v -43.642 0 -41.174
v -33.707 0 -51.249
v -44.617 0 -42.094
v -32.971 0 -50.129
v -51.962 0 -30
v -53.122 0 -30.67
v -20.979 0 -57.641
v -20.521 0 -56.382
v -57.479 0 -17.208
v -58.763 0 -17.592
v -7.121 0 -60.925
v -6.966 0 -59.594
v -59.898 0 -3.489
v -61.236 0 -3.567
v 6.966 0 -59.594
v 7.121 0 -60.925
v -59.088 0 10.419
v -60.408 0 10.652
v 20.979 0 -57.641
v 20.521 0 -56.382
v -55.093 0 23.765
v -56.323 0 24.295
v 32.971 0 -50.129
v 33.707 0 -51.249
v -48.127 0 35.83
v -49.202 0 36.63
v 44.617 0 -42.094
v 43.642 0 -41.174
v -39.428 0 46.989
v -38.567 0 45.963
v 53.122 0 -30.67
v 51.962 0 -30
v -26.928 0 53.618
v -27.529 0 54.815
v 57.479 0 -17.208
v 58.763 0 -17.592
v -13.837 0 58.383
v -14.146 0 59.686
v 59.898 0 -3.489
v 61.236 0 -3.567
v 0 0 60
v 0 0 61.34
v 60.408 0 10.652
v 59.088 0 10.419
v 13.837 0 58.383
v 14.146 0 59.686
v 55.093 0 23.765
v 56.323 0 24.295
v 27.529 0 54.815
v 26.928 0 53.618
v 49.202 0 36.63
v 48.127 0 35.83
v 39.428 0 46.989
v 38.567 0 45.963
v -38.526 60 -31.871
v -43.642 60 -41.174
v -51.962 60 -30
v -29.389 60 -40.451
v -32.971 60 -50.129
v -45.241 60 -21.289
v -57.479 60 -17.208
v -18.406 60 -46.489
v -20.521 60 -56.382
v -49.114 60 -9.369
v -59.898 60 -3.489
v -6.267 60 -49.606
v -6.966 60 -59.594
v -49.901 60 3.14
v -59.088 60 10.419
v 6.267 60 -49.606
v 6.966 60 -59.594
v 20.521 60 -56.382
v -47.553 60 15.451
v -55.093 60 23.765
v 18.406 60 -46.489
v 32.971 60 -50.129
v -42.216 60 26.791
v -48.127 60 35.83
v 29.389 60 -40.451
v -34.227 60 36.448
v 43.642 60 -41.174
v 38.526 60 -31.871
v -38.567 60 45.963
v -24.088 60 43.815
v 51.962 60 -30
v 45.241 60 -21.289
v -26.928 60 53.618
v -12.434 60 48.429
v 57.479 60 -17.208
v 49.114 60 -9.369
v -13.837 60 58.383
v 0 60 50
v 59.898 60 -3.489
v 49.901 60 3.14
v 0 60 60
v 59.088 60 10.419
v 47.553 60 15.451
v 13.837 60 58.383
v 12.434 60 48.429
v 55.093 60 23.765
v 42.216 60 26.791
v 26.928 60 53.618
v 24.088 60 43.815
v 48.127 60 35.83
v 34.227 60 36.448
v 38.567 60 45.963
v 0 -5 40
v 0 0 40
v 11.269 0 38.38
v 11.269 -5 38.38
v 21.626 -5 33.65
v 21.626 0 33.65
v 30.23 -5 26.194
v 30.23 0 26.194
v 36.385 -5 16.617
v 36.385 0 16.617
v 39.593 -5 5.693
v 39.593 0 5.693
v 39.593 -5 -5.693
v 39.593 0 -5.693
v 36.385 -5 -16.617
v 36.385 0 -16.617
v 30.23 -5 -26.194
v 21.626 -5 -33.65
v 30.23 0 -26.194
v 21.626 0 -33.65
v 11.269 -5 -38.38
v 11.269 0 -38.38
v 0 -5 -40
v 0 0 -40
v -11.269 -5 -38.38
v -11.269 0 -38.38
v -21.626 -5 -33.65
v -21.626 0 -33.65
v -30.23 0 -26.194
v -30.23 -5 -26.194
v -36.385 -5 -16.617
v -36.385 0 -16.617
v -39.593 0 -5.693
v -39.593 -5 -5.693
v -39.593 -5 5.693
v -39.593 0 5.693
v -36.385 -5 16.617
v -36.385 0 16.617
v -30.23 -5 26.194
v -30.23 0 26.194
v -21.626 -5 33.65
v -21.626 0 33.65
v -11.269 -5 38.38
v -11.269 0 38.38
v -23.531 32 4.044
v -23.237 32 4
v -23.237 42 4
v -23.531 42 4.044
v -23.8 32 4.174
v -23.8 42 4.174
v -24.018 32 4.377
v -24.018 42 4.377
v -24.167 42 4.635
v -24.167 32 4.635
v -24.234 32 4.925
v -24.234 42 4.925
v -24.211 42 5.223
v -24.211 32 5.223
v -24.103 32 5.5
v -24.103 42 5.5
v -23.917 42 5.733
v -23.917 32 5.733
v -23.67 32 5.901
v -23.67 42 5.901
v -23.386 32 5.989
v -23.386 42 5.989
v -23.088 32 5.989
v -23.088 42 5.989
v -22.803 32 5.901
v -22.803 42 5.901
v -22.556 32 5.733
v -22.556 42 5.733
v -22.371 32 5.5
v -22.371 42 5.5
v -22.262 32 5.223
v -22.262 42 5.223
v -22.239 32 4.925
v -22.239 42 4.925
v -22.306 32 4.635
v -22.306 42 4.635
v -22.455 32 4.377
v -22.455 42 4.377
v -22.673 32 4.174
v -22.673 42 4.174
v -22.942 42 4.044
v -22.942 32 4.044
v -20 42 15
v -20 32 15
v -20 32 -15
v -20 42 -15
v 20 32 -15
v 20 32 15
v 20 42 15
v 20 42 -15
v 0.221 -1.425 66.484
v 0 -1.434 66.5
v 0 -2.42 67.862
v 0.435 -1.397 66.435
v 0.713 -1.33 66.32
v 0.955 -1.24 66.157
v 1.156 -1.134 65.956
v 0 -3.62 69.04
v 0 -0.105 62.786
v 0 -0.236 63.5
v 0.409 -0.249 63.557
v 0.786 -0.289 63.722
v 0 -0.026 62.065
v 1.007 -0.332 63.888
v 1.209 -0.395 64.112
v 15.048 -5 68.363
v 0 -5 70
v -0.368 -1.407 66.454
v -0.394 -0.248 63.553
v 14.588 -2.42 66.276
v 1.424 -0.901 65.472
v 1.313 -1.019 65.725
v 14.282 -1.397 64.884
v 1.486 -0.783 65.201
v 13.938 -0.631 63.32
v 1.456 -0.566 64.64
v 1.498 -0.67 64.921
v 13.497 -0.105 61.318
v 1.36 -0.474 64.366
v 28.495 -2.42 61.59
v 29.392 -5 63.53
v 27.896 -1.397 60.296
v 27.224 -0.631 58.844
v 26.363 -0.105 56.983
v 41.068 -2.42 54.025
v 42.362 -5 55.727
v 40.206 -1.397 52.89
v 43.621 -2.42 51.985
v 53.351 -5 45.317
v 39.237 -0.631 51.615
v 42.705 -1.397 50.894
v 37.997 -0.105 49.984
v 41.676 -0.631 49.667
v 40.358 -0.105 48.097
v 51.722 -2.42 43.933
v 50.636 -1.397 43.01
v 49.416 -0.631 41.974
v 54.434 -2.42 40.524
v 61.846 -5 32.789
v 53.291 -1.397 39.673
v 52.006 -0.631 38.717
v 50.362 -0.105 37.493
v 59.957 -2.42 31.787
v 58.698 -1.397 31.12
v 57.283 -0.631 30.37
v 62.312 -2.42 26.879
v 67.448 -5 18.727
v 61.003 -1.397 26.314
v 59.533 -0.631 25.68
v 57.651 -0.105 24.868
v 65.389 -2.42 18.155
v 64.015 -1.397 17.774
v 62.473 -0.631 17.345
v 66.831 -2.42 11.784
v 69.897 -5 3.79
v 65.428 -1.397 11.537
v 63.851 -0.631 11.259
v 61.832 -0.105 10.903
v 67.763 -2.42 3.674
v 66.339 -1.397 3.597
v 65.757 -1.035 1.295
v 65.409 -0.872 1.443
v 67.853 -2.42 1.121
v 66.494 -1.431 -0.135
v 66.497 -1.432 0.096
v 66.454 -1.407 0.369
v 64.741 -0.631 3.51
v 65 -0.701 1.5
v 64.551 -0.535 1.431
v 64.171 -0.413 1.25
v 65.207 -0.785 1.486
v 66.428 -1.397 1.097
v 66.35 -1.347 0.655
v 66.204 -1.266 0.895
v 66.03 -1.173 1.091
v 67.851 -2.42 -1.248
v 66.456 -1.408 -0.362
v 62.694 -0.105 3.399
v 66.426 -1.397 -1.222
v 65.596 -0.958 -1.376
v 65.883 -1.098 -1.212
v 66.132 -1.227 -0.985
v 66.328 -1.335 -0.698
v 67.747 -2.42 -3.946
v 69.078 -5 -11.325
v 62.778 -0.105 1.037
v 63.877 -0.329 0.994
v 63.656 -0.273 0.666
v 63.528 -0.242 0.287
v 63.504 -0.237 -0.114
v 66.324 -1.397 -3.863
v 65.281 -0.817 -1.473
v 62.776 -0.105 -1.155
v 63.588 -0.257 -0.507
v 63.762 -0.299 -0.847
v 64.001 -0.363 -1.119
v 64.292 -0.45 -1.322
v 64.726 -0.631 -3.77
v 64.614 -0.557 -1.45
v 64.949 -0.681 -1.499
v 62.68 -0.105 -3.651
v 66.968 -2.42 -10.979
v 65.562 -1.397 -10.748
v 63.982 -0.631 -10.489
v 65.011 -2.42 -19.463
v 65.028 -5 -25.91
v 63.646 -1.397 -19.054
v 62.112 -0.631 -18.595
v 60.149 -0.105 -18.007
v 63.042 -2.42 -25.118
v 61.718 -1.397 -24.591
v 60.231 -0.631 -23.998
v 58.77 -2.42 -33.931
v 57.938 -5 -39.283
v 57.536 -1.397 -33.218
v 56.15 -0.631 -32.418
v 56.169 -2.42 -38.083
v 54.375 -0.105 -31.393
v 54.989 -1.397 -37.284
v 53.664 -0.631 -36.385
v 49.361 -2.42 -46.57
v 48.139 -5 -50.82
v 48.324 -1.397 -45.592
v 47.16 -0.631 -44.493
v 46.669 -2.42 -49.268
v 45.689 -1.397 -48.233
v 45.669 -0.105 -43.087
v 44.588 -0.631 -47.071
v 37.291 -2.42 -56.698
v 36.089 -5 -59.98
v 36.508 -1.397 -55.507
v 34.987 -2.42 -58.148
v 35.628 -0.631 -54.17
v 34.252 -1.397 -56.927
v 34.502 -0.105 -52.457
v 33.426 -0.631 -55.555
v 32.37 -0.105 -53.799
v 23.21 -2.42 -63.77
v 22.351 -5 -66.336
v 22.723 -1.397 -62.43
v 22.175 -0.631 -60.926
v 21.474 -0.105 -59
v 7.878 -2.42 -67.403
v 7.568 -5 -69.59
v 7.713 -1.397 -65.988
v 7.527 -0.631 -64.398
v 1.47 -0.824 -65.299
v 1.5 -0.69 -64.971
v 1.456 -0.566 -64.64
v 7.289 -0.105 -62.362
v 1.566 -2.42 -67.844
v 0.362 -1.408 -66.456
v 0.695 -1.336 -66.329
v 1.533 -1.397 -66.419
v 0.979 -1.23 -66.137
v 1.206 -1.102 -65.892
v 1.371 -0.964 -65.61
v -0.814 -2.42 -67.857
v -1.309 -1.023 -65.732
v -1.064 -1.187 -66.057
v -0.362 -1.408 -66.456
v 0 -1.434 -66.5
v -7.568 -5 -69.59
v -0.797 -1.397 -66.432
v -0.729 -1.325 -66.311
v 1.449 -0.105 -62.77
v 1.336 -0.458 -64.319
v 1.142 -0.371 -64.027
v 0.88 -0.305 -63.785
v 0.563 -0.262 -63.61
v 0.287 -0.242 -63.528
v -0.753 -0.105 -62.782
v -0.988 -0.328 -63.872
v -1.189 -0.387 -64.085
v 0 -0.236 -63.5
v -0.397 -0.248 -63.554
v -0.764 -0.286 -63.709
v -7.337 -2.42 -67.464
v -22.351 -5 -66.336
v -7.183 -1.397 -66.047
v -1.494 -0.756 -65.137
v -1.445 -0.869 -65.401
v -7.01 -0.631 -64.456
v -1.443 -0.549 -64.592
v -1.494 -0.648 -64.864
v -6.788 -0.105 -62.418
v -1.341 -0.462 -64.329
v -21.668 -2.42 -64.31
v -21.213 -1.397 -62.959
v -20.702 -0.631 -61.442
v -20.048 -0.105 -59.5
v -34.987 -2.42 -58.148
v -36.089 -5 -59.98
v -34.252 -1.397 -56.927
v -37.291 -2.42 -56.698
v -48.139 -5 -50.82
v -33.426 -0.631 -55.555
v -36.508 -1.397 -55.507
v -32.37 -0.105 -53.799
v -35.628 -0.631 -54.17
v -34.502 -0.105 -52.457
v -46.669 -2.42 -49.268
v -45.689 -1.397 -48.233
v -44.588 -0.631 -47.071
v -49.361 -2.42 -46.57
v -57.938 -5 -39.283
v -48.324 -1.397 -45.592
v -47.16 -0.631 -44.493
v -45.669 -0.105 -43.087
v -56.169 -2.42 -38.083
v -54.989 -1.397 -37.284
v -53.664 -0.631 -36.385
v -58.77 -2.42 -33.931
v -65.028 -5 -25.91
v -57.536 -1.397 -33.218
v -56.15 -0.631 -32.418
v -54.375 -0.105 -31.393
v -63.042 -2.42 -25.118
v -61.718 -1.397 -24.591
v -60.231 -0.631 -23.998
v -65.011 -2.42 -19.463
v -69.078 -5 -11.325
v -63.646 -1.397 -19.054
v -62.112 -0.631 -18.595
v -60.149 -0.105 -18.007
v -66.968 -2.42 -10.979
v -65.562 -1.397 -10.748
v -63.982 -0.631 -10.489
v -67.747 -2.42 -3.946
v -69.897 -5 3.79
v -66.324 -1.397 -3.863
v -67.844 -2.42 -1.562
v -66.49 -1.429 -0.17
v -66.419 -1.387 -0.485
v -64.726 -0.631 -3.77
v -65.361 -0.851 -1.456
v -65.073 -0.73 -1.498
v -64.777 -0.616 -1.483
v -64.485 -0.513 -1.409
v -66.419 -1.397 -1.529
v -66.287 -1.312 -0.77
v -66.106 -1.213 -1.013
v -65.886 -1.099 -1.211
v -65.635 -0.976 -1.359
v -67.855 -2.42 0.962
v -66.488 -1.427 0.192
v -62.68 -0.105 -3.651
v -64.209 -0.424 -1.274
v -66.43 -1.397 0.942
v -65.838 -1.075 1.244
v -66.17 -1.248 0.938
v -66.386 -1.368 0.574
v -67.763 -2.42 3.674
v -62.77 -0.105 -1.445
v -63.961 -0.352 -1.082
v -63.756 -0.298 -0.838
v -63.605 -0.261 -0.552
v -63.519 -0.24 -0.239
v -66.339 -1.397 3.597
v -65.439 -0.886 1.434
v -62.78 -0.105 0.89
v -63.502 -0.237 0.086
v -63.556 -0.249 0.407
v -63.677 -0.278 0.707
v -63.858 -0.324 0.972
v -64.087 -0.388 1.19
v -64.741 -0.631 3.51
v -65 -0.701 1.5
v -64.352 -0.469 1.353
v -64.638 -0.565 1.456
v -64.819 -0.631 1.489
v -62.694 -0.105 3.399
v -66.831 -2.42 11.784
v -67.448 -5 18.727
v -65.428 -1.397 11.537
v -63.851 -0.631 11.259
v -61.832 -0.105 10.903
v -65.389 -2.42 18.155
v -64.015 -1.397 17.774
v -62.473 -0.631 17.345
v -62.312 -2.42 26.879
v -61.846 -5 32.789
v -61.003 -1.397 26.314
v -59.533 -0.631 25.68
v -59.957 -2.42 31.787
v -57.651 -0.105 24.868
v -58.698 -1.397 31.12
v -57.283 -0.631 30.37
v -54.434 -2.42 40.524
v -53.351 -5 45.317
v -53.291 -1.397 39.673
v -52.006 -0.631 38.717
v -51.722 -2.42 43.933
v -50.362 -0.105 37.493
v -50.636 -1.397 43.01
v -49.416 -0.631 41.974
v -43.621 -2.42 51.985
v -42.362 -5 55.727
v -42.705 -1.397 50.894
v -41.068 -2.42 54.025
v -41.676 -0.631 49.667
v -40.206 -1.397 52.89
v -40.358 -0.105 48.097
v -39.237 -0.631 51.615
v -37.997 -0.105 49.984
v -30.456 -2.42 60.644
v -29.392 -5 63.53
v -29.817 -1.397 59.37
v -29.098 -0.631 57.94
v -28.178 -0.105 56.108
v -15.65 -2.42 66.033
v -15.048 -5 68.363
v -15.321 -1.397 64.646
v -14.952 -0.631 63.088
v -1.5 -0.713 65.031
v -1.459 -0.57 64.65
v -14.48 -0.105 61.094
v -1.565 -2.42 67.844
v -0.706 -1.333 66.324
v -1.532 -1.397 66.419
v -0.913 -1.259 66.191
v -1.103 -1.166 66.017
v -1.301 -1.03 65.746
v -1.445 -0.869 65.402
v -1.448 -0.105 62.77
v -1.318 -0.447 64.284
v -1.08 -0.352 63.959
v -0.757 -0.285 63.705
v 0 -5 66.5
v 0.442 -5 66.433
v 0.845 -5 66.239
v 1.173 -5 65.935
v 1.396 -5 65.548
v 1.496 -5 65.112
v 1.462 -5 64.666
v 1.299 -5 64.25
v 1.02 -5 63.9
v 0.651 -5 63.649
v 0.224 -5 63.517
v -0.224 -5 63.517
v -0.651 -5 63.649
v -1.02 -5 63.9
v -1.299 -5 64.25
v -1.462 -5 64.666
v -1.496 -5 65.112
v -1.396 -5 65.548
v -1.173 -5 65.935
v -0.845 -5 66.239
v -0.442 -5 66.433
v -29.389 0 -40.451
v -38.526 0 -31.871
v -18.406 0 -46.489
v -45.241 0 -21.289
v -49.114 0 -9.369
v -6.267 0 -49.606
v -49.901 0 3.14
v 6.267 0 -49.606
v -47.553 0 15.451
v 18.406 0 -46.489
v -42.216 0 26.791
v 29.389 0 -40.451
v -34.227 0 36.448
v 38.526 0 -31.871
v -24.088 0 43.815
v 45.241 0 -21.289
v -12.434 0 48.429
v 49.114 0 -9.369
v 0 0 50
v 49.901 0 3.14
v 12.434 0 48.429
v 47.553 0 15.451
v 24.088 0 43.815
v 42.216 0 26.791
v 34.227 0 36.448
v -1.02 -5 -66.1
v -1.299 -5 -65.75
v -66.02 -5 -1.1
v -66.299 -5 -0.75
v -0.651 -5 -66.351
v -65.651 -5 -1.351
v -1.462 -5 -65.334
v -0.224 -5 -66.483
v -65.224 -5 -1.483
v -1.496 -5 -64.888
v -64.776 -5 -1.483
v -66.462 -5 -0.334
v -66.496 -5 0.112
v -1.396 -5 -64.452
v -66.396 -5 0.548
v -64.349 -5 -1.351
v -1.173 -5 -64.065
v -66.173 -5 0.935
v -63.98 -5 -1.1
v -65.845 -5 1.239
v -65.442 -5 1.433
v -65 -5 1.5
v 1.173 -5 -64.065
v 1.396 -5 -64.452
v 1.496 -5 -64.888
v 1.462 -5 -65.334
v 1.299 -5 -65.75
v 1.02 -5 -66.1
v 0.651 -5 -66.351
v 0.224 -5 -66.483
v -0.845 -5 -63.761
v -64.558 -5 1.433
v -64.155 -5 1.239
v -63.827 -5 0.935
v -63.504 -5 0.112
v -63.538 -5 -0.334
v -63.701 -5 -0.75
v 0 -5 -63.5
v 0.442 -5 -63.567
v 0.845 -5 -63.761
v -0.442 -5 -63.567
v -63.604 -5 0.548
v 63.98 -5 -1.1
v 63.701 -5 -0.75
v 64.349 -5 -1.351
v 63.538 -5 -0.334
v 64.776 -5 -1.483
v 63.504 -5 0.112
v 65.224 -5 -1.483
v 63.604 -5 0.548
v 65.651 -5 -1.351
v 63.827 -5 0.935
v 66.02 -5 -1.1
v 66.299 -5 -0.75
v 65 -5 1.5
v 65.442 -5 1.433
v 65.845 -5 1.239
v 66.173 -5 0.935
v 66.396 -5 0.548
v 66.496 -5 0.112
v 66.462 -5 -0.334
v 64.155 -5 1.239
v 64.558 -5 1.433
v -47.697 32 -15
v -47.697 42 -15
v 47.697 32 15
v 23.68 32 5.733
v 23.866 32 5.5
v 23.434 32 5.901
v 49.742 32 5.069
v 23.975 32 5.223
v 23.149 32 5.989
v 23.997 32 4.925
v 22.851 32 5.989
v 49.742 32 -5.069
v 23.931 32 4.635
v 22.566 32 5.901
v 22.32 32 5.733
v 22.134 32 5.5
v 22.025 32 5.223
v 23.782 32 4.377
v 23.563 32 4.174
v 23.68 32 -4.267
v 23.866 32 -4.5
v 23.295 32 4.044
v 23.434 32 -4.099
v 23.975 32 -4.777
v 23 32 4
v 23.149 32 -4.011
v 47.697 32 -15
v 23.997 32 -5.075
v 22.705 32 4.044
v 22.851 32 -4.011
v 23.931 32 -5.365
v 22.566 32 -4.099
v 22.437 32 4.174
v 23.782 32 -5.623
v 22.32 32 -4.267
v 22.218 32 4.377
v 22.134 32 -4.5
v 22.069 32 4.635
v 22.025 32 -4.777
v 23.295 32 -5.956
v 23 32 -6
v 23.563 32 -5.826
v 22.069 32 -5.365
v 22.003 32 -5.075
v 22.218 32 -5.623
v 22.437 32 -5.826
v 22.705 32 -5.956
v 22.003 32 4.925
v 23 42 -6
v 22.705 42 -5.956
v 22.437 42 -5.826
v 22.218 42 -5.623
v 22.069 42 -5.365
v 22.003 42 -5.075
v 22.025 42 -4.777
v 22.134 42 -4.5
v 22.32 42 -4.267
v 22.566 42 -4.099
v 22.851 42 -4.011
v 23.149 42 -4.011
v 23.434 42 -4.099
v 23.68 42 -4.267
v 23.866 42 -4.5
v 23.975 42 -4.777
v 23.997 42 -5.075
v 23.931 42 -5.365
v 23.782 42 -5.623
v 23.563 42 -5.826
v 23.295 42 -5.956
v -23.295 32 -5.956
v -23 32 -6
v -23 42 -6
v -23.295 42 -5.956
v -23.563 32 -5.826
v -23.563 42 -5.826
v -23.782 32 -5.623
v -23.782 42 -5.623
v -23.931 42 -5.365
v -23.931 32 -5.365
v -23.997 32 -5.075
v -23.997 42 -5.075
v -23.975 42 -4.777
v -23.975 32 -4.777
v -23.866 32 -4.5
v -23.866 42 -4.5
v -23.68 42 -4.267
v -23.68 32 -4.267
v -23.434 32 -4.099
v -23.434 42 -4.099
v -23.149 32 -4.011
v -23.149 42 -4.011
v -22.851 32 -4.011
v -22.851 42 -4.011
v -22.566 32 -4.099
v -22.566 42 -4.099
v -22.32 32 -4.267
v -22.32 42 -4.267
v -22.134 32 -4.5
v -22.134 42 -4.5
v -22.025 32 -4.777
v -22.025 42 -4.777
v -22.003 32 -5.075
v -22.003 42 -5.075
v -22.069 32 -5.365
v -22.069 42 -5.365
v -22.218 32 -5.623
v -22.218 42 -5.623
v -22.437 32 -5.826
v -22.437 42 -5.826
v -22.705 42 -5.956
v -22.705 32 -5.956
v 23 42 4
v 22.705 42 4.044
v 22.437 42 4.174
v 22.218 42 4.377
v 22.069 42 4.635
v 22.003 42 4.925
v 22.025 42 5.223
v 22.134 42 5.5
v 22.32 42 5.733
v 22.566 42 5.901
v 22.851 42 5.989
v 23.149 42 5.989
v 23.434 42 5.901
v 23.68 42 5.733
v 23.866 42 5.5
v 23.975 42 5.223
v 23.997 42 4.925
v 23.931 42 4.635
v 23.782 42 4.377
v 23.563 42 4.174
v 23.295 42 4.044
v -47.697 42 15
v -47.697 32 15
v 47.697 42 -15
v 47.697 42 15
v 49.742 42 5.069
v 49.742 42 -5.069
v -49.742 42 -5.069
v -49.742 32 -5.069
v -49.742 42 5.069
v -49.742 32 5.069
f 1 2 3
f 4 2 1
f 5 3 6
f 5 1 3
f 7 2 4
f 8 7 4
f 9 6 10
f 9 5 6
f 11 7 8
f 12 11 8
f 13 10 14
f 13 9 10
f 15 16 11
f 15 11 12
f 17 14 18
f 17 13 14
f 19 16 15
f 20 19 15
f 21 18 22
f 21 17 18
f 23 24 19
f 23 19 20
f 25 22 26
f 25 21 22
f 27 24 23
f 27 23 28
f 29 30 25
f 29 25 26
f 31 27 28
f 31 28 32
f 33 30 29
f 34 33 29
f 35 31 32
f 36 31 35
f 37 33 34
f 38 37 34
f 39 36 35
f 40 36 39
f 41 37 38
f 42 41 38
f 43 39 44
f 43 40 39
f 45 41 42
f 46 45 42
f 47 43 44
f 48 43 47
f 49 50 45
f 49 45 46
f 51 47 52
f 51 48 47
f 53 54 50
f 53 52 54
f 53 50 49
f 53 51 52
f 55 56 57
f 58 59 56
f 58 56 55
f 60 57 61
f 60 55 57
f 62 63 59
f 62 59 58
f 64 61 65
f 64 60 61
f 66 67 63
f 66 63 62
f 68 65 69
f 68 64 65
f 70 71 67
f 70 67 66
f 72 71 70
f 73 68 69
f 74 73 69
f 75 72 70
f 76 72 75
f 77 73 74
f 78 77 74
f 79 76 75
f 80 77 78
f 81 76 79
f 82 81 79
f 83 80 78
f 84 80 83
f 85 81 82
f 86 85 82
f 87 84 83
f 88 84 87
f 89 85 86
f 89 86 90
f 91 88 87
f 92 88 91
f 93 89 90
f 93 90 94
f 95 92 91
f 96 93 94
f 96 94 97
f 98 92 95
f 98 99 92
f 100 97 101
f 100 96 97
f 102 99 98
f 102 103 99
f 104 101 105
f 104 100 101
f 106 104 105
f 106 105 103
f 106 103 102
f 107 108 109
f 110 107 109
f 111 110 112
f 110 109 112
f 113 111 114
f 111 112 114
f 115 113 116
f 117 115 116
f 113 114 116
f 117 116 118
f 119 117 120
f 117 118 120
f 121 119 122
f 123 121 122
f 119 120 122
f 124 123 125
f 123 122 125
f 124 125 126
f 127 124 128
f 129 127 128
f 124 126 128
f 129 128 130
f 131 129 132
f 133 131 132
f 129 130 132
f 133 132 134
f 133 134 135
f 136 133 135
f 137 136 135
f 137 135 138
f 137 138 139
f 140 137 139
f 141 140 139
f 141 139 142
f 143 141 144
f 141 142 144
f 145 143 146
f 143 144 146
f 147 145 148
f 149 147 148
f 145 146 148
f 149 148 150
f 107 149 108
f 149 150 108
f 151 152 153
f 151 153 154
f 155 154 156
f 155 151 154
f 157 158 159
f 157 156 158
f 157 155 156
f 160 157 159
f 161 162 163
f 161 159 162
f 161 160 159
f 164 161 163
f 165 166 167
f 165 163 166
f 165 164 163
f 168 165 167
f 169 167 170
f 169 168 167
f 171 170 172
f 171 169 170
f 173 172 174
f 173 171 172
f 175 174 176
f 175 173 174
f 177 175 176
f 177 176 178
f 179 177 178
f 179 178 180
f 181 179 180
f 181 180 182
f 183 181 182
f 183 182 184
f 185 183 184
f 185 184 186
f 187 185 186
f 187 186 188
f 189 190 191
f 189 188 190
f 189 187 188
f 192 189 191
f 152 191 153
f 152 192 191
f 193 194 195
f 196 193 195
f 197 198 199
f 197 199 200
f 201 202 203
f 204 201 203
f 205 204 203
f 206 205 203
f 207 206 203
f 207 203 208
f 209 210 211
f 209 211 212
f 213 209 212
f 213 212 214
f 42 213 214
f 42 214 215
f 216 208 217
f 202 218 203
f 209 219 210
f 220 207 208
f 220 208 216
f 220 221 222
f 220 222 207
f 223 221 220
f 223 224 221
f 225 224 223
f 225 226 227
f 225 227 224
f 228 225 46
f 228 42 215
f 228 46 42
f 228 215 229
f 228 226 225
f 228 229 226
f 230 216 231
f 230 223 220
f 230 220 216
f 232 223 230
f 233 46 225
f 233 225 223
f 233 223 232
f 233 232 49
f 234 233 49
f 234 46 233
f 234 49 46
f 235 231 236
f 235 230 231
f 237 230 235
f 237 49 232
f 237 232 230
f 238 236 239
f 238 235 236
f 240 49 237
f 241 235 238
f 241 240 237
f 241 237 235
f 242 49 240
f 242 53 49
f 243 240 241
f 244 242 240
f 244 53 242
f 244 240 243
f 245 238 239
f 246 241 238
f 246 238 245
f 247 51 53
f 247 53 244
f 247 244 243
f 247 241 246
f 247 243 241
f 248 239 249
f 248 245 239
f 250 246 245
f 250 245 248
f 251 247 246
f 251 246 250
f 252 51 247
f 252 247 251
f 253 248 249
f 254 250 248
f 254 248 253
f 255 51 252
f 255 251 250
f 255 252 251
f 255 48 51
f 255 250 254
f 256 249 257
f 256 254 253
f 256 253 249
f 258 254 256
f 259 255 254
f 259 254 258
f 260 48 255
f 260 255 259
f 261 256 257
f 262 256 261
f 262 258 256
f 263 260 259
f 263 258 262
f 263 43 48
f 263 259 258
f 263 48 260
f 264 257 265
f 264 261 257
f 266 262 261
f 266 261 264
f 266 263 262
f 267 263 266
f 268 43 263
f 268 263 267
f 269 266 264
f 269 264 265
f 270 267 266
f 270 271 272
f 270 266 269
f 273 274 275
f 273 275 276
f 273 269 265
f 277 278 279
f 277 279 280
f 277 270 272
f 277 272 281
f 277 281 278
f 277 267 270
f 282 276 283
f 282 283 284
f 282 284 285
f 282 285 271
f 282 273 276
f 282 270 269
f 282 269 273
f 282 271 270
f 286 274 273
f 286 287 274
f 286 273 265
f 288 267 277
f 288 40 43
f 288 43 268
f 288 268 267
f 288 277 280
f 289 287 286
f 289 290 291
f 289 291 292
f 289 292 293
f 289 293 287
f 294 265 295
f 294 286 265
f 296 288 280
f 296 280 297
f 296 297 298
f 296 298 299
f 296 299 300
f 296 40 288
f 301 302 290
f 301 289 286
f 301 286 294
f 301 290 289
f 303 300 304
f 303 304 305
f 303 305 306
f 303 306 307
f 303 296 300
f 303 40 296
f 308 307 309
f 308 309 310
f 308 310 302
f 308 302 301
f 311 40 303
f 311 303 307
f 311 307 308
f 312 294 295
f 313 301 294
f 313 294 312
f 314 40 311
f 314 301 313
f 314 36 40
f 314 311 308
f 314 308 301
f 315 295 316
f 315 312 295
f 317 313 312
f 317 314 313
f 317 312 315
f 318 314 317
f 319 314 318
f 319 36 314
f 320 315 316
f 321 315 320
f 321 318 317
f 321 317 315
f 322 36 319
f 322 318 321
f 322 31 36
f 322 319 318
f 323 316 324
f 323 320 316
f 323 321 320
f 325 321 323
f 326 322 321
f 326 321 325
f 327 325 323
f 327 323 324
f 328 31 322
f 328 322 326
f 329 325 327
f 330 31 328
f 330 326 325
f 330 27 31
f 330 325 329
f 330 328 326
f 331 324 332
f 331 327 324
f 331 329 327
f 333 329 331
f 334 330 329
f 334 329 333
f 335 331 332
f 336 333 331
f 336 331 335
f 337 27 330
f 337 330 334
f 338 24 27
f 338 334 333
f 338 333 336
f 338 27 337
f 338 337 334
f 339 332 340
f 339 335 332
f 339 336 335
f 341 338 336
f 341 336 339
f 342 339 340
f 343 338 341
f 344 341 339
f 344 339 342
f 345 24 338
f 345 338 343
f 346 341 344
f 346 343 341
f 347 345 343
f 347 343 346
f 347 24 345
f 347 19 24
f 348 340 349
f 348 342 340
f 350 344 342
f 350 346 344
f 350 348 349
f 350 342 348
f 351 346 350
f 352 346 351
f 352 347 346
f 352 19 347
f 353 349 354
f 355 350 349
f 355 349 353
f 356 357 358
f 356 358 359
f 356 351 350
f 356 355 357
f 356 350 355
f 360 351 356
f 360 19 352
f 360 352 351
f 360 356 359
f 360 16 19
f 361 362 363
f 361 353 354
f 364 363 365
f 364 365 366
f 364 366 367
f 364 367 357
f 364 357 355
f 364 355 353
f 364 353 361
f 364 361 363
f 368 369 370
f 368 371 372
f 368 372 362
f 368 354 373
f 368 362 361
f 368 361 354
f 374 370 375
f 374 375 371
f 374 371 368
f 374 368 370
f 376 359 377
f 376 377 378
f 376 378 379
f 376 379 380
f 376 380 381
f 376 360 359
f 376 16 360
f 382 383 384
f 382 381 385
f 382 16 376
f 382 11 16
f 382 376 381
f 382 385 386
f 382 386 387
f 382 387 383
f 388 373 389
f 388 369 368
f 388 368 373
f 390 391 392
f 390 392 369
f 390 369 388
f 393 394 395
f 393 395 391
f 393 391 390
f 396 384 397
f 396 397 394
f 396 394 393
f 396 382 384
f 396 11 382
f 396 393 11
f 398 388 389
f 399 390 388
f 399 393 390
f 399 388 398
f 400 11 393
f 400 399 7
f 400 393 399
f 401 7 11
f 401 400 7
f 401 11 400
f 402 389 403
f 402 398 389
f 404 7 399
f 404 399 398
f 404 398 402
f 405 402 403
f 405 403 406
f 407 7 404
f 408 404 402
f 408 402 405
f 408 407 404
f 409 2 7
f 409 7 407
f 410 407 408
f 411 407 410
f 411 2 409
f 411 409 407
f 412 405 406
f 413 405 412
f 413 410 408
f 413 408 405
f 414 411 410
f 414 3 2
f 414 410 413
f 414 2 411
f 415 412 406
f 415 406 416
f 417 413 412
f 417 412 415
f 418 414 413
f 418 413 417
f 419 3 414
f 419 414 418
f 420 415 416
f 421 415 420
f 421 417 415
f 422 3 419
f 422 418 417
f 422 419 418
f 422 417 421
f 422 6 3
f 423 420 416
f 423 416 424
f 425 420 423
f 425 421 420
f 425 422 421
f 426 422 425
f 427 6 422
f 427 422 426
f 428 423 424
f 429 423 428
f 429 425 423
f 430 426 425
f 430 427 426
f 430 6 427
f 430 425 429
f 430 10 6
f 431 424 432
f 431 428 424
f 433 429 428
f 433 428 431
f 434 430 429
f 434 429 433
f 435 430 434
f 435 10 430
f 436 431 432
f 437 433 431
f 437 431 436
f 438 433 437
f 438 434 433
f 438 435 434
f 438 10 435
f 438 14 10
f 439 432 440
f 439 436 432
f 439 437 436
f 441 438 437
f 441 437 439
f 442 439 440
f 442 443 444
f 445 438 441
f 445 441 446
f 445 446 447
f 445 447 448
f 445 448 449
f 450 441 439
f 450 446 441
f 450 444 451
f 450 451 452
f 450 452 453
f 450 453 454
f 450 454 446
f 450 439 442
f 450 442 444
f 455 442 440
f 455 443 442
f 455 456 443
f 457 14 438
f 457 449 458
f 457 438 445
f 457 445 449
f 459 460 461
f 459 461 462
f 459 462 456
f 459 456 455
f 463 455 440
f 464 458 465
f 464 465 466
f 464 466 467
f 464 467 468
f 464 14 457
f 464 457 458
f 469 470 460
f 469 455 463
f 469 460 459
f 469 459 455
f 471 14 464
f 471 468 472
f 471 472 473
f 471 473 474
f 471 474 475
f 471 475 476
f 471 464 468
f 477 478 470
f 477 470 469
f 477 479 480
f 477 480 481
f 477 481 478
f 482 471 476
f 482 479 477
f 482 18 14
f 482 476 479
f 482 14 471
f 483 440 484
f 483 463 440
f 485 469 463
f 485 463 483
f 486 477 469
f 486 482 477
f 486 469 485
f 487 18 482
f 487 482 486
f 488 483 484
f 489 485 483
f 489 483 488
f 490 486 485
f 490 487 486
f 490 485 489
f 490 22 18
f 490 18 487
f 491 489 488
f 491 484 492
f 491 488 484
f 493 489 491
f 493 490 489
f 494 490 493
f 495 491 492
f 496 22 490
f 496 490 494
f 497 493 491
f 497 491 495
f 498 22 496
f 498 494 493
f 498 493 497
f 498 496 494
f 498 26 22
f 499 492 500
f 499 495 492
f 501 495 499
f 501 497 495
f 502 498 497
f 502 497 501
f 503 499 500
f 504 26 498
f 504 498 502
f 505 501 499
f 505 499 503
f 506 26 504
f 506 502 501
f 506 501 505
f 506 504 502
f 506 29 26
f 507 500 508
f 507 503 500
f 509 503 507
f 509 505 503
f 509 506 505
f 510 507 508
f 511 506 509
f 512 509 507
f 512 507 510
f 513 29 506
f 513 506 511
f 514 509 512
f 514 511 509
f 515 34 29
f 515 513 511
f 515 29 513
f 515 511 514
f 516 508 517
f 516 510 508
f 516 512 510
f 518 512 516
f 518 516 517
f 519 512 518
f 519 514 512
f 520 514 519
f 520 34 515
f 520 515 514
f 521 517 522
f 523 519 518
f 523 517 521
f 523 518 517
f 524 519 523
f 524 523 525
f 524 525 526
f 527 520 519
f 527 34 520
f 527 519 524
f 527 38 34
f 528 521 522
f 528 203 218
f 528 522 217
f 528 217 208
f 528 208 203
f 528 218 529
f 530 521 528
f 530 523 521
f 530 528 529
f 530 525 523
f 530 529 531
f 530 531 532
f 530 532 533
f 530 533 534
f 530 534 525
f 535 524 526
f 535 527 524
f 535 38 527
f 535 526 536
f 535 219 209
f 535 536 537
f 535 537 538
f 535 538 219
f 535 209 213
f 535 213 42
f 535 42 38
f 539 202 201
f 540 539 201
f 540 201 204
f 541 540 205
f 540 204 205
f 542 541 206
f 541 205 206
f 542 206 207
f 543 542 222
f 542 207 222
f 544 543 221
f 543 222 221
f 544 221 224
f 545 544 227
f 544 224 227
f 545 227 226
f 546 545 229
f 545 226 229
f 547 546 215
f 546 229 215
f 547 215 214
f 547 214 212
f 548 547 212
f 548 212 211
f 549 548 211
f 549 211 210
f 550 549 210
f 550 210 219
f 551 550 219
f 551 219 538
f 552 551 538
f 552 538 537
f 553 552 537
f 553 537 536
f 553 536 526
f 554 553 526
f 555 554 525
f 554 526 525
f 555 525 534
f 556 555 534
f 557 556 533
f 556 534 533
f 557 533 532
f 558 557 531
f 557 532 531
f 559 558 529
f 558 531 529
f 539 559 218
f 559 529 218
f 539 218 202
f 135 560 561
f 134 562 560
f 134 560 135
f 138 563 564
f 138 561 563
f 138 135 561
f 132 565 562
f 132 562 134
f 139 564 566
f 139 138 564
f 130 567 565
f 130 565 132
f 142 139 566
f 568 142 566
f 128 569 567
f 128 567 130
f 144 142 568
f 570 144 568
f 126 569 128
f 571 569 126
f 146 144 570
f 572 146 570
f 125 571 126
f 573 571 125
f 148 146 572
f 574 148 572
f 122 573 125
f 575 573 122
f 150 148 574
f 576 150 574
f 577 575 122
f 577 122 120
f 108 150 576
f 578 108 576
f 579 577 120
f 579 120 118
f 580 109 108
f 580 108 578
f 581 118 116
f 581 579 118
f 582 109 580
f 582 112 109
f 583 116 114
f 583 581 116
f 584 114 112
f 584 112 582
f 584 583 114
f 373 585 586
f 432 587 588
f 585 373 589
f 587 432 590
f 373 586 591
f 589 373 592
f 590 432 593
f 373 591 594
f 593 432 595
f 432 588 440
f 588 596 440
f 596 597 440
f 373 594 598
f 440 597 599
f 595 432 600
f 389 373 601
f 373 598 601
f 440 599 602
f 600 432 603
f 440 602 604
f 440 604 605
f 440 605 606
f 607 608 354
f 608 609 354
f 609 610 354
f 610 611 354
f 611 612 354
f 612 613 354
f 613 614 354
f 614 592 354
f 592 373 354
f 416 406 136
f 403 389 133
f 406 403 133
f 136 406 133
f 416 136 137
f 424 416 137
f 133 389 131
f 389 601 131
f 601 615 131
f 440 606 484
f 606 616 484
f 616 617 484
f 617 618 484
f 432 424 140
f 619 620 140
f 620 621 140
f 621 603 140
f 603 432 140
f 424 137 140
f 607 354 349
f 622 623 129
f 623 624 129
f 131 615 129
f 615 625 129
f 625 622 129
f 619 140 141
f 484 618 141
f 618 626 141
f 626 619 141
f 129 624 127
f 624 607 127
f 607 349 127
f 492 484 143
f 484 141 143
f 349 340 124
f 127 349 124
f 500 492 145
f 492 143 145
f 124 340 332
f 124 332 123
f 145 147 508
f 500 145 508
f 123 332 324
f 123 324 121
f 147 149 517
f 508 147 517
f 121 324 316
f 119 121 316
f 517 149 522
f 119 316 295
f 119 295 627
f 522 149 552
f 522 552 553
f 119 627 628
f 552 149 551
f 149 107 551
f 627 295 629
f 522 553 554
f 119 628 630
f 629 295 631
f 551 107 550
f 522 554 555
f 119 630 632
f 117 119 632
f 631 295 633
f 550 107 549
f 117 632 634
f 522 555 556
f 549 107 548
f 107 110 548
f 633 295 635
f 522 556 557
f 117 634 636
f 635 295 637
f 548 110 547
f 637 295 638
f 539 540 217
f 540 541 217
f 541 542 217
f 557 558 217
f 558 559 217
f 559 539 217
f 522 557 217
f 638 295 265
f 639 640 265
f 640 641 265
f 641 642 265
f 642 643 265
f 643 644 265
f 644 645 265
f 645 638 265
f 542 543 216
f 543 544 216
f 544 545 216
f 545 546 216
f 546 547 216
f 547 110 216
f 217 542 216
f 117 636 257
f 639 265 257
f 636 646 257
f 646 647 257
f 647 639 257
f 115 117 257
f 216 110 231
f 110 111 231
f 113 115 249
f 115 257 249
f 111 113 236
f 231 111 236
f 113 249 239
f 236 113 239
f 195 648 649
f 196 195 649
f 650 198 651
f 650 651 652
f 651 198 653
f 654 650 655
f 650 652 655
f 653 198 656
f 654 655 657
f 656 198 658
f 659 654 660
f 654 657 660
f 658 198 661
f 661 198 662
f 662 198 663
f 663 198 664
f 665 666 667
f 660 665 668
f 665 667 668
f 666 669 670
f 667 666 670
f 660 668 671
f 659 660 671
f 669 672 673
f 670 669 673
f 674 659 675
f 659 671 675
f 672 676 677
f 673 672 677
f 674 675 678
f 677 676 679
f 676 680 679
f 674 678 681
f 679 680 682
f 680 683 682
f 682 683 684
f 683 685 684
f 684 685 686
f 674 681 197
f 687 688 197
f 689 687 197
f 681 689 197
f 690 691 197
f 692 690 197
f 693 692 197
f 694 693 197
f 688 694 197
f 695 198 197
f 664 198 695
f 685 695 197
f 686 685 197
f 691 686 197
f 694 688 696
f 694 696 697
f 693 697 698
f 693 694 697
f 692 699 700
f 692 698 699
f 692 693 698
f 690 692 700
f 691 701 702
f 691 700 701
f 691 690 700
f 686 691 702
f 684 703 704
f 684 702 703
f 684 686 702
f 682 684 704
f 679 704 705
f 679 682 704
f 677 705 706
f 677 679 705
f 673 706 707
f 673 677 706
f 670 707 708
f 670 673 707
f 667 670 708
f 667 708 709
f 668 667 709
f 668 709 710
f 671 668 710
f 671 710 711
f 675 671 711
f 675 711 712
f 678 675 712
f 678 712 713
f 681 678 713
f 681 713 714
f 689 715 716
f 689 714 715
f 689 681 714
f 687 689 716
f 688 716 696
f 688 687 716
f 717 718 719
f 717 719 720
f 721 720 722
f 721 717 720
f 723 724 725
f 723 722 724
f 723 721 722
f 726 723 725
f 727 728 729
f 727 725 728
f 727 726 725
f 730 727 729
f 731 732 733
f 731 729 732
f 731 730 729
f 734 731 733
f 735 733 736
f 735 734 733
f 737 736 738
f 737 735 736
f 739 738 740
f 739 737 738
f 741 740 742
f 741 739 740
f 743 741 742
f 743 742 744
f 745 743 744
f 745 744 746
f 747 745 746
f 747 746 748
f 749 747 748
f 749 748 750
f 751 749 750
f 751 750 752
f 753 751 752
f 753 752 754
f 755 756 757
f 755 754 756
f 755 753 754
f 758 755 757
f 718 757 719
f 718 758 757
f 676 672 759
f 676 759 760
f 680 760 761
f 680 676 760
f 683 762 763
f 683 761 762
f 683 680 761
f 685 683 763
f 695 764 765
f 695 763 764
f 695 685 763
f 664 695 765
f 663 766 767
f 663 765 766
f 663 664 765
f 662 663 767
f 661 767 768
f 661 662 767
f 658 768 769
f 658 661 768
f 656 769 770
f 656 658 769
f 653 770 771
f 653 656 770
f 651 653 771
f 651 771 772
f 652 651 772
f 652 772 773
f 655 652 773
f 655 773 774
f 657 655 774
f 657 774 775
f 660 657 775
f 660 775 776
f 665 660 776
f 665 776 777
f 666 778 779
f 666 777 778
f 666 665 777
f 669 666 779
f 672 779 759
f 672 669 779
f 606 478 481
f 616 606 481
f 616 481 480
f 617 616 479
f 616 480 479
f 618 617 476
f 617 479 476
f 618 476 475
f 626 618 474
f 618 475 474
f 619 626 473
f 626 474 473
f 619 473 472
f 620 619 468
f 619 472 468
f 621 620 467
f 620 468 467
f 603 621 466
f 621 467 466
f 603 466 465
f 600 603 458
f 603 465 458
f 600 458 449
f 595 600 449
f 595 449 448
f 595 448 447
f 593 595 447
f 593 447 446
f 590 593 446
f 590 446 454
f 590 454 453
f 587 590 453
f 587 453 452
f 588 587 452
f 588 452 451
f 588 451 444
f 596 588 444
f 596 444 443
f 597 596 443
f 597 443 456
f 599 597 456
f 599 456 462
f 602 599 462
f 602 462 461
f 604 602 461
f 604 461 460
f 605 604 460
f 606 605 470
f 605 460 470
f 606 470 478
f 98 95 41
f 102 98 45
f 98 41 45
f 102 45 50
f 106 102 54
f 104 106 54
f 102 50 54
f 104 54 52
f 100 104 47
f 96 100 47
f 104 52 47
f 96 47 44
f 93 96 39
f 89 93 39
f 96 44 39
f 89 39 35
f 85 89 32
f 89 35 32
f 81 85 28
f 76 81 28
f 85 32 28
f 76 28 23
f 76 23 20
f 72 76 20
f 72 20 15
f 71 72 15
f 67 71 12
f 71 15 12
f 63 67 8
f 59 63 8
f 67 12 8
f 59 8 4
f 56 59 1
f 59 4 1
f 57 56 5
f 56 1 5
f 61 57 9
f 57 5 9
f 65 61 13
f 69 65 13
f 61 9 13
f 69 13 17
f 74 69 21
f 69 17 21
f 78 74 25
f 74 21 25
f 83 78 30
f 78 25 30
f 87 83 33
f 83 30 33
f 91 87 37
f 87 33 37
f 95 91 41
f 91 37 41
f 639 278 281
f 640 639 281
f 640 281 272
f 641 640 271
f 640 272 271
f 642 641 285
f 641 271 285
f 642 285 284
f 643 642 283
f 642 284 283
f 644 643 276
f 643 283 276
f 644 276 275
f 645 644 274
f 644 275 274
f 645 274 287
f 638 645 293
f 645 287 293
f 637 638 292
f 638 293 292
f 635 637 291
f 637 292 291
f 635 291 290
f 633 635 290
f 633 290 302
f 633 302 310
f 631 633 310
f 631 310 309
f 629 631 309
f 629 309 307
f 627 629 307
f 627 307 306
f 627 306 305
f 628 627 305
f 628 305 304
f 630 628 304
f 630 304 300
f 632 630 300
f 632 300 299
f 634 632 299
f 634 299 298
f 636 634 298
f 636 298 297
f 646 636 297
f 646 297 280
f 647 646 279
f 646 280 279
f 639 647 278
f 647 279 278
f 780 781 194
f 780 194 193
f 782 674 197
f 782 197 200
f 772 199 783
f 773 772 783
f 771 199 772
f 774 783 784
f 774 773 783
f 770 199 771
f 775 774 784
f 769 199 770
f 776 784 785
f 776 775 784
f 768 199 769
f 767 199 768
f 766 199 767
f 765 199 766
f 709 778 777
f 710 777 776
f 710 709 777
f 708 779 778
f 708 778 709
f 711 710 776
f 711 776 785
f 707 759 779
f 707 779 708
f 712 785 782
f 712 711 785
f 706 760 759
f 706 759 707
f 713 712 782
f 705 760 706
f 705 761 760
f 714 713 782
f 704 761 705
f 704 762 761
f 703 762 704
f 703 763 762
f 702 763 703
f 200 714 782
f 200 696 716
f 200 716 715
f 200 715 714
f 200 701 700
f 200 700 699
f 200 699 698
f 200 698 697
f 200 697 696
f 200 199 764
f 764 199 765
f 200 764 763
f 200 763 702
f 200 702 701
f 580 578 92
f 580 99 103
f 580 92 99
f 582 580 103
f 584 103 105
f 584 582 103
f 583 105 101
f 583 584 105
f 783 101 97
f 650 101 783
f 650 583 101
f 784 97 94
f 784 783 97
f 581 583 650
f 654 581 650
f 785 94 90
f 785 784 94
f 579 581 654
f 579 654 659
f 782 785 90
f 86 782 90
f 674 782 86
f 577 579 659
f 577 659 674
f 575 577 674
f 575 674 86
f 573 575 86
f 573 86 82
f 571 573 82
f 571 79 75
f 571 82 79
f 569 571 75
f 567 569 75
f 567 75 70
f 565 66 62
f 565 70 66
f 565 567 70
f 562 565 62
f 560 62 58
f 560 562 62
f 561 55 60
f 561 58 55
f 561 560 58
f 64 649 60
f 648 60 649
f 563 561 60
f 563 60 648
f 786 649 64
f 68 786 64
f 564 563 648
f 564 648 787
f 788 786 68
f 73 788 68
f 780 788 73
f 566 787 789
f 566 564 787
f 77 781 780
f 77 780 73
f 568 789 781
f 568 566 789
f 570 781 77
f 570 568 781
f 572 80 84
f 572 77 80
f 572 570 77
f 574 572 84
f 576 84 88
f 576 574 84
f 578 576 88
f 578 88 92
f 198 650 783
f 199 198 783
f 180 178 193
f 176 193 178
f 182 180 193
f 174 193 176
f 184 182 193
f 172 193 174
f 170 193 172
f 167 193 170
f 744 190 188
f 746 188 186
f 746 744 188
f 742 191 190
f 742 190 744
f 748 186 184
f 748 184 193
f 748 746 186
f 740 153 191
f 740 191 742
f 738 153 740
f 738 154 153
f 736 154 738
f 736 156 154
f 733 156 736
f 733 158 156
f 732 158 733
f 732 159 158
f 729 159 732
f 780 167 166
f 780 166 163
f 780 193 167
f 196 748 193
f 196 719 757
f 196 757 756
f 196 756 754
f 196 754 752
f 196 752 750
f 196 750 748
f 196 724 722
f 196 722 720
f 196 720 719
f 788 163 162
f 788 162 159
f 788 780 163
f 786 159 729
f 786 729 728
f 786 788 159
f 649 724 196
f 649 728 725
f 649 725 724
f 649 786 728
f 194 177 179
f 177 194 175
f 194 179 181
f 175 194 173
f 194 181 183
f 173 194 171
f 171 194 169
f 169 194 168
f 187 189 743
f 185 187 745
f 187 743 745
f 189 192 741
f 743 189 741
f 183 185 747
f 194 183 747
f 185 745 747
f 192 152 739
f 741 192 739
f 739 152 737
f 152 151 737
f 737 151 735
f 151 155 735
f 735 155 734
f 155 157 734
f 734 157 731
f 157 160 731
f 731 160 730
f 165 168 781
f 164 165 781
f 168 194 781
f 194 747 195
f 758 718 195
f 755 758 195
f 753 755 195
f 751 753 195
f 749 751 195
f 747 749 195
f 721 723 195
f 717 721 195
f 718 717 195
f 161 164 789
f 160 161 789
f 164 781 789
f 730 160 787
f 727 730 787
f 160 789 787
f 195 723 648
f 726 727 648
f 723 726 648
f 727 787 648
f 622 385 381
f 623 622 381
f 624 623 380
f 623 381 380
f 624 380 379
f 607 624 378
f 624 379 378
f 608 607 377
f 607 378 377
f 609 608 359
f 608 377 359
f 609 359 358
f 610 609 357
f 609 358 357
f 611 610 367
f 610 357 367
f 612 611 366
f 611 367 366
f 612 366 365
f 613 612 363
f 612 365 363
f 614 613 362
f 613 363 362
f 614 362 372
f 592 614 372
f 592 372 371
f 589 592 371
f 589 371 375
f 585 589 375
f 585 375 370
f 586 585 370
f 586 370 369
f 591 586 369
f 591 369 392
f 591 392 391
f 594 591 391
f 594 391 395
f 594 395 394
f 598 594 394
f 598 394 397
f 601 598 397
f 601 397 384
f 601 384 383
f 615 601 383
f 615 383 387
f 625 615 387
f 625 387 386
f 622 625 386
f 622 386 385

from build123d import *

# Parameters (mm, degrees)
SKETCH1_R                = 60
BOSS_EXTRUDE1_DEPTH      = 60
SHELL1_T                 = -10
SKETCH2_R                = 70
BOSS_EXTRUDE2_DEPTH      = 5
SKETCH5_R                = 40
CUT_EXTRUDE4_DEPTH       = 5
FILLET1_R                = 10
BOSS_EXTRUDE4_DEPTH      = 55
BOSS_EXTRUDE4_DEPTH_BACK = 54
SKETCH7_W                = 30
SKETCH7_H                = 10
SKETCH8_W                = 40
SKETCH8_H                = 32
CUT_EXTRUDE6_DEPTH       = 55
SKETCH9_R                = 1
CUT_EXTRUDE7_DEPTH       = 55
SKETCH10_R               = 1.5
CUT_EXTRUDE8_DEPTH       = 30


with BuildPart() as part:
    # Sketch1 → Boss-Extrude1 (new body)
    with BuildSketch(Plane(origin=(0, 0, 0), x_dir=(1, 0, 0), z_dir=(0, 1, 0))):
        with Locations(Location((0, 0, 0), (0, 0, 270))):
            Circle(SKETCH1_R)
    extrude(amount=BOSS_EXTRUDE1_DEPTH)

    # Shell1
    shell1_openings = [part.faces().sort_by_distance(p)[0] for p in [
        (0, 60, 0),
        (0, 0, 0),
    ]]
    offset(amount=SHELL1_T, openings=shell1_openings, kind=Kind.INTERSECTION)

    # Sketch2 → Boss-Extrude2 (add)
    with BuildSketch(Plane(origin=(0, 0, 0), x_dir=(1, 0, 0), z_dir=(0, 1, 0))):
        with Locations(Location((0, 0, 0), (0, 0, 270))):
            Circle(SKETCH2_R)
    extrude(amount=-BOSS_EXTRUDE2_DEPTH)

    # Sketch5 → Cut-Extrude4 (cut)
    with BuildSketch(Plane(origin=(0, 0, 0), x_dir=(1, 0, 0), z_dir=(0, 1, 0))):
        with Locations(Location((0, 0, 0), (0, 0, 270))):
            Circle(SKETCH5_R)
    extrude(amount=-CUT_EXTRUDE4_DEPTH, mode=Mode.SUBTRACT)

    # Fillet1
    # the kernel refuses this fillet: 10 mm, written as the material it takes off along each edge
    with BuildSketch(Plane(origin=(0, 0, 0), x_dir=(0, 0, 1), z_dir=(-1, 0, 0))) as fillet1_piece_1:
        with BuildLine():
            CenterArc((61.339745962, -10), FILLET1_R, 30, 60)
            Line((61.339745962, 0), (61.339745962, 0.2))
            Line((61.339745962, 0.2), (70, 0.2))
            Line((70, 0.2), (70.2, 0))
            ThreePointArc((70.2, 0), (70.2, -2.5), (70.173205081, -4.9))
            Line((70.173205081, -4.9), (70, -5))
        make_face()
    revolve(axis=Axis((0, 0, 0), (0, 1, 0)), mode=Mode.SUBTRACT)

    # Sketch7 → Boss-Extrude4 (add, two sides: drawn at the far end of the back side and taken through both)
    with BuildSketch(Plane(origin=(0, 0, 0), x_dir=(0, 0, -1), z_dir=(1, 0, 0)).offset(-BOSS_EXTRUDE4_DEPTH_BACK)):
        with Locations((0, 37)):
            Rectangle(SKETCH7_W, SKETCH7_H)
    extrude(amount=BOSS_EXTRUDE4_DEPTH + BOSS_EXTRUDE4_DEPTH_BACK)

    # Sketch8 → Cut-Extrude6 (cut)
    with BuildSketch(Plane(origin=(0, 0, 0), x_dir=(1, 0, 0), z_dir=(0, 1, 0))):
        Rectangle(SKETCH8_W, SKETCH8_H)
    extrude(amount=CUT_EXTRUDE6_DEPTH, mode=Mode.SUBTRACT)

    # Sketch9 → Cut-Extrude7 (cut)
    with BuildSketch(Plane(origin=(0, 0, 0), x_dir=(1, 0, 0), z_dir=(0, 1, 0))):
        with Locations(Location((-23, 5, 0), (0, 0, 90))):
            Circle(SKETCH9_R)
        with Locations(Location((-23.236551587, -5, 0), (0, 0, 90))):
            Circle(SKETCH9_R)
        with Locations(Location((23, 5, 0), (0, 0, 90))):
            Circle(SKETCH9_R)
        with Locations(Location((23, -5, 0), (0, 0, 90))):
            Circle(SKETCH9_R)
    extrude(amount=CUT_EXTRUDE7_DEPTH, mode=Mode.SUBTRACT)

    # Sketch10 → Cut-Extrude8 (cut)
    with BuildSketch(Plane(origin=(0, 0, 0), x_dir=(1, 0, 0), z_dir=(0, 1, 0))):
        with Locations(Location((0, 65, 0), (0, 0, 270))):
            Circle(SKETCH10_R)
        with Locations(Location((65, 0, 0), (0, 0, 270))):
            Circle(SKETCH10_R)
        with Locations(Location((0, -65, 0), (0, 0, 270))):
            Circle(SKETCH10_R)
        with Locations(Location((-65, 0, 0), (0, 0, 270))):
            Circle(SKETCH10_R)
    extrude(amount=-CUT_EXTRUDE8_DEPTH, mode=Mode.SUBTRACT)


solid = part.part
